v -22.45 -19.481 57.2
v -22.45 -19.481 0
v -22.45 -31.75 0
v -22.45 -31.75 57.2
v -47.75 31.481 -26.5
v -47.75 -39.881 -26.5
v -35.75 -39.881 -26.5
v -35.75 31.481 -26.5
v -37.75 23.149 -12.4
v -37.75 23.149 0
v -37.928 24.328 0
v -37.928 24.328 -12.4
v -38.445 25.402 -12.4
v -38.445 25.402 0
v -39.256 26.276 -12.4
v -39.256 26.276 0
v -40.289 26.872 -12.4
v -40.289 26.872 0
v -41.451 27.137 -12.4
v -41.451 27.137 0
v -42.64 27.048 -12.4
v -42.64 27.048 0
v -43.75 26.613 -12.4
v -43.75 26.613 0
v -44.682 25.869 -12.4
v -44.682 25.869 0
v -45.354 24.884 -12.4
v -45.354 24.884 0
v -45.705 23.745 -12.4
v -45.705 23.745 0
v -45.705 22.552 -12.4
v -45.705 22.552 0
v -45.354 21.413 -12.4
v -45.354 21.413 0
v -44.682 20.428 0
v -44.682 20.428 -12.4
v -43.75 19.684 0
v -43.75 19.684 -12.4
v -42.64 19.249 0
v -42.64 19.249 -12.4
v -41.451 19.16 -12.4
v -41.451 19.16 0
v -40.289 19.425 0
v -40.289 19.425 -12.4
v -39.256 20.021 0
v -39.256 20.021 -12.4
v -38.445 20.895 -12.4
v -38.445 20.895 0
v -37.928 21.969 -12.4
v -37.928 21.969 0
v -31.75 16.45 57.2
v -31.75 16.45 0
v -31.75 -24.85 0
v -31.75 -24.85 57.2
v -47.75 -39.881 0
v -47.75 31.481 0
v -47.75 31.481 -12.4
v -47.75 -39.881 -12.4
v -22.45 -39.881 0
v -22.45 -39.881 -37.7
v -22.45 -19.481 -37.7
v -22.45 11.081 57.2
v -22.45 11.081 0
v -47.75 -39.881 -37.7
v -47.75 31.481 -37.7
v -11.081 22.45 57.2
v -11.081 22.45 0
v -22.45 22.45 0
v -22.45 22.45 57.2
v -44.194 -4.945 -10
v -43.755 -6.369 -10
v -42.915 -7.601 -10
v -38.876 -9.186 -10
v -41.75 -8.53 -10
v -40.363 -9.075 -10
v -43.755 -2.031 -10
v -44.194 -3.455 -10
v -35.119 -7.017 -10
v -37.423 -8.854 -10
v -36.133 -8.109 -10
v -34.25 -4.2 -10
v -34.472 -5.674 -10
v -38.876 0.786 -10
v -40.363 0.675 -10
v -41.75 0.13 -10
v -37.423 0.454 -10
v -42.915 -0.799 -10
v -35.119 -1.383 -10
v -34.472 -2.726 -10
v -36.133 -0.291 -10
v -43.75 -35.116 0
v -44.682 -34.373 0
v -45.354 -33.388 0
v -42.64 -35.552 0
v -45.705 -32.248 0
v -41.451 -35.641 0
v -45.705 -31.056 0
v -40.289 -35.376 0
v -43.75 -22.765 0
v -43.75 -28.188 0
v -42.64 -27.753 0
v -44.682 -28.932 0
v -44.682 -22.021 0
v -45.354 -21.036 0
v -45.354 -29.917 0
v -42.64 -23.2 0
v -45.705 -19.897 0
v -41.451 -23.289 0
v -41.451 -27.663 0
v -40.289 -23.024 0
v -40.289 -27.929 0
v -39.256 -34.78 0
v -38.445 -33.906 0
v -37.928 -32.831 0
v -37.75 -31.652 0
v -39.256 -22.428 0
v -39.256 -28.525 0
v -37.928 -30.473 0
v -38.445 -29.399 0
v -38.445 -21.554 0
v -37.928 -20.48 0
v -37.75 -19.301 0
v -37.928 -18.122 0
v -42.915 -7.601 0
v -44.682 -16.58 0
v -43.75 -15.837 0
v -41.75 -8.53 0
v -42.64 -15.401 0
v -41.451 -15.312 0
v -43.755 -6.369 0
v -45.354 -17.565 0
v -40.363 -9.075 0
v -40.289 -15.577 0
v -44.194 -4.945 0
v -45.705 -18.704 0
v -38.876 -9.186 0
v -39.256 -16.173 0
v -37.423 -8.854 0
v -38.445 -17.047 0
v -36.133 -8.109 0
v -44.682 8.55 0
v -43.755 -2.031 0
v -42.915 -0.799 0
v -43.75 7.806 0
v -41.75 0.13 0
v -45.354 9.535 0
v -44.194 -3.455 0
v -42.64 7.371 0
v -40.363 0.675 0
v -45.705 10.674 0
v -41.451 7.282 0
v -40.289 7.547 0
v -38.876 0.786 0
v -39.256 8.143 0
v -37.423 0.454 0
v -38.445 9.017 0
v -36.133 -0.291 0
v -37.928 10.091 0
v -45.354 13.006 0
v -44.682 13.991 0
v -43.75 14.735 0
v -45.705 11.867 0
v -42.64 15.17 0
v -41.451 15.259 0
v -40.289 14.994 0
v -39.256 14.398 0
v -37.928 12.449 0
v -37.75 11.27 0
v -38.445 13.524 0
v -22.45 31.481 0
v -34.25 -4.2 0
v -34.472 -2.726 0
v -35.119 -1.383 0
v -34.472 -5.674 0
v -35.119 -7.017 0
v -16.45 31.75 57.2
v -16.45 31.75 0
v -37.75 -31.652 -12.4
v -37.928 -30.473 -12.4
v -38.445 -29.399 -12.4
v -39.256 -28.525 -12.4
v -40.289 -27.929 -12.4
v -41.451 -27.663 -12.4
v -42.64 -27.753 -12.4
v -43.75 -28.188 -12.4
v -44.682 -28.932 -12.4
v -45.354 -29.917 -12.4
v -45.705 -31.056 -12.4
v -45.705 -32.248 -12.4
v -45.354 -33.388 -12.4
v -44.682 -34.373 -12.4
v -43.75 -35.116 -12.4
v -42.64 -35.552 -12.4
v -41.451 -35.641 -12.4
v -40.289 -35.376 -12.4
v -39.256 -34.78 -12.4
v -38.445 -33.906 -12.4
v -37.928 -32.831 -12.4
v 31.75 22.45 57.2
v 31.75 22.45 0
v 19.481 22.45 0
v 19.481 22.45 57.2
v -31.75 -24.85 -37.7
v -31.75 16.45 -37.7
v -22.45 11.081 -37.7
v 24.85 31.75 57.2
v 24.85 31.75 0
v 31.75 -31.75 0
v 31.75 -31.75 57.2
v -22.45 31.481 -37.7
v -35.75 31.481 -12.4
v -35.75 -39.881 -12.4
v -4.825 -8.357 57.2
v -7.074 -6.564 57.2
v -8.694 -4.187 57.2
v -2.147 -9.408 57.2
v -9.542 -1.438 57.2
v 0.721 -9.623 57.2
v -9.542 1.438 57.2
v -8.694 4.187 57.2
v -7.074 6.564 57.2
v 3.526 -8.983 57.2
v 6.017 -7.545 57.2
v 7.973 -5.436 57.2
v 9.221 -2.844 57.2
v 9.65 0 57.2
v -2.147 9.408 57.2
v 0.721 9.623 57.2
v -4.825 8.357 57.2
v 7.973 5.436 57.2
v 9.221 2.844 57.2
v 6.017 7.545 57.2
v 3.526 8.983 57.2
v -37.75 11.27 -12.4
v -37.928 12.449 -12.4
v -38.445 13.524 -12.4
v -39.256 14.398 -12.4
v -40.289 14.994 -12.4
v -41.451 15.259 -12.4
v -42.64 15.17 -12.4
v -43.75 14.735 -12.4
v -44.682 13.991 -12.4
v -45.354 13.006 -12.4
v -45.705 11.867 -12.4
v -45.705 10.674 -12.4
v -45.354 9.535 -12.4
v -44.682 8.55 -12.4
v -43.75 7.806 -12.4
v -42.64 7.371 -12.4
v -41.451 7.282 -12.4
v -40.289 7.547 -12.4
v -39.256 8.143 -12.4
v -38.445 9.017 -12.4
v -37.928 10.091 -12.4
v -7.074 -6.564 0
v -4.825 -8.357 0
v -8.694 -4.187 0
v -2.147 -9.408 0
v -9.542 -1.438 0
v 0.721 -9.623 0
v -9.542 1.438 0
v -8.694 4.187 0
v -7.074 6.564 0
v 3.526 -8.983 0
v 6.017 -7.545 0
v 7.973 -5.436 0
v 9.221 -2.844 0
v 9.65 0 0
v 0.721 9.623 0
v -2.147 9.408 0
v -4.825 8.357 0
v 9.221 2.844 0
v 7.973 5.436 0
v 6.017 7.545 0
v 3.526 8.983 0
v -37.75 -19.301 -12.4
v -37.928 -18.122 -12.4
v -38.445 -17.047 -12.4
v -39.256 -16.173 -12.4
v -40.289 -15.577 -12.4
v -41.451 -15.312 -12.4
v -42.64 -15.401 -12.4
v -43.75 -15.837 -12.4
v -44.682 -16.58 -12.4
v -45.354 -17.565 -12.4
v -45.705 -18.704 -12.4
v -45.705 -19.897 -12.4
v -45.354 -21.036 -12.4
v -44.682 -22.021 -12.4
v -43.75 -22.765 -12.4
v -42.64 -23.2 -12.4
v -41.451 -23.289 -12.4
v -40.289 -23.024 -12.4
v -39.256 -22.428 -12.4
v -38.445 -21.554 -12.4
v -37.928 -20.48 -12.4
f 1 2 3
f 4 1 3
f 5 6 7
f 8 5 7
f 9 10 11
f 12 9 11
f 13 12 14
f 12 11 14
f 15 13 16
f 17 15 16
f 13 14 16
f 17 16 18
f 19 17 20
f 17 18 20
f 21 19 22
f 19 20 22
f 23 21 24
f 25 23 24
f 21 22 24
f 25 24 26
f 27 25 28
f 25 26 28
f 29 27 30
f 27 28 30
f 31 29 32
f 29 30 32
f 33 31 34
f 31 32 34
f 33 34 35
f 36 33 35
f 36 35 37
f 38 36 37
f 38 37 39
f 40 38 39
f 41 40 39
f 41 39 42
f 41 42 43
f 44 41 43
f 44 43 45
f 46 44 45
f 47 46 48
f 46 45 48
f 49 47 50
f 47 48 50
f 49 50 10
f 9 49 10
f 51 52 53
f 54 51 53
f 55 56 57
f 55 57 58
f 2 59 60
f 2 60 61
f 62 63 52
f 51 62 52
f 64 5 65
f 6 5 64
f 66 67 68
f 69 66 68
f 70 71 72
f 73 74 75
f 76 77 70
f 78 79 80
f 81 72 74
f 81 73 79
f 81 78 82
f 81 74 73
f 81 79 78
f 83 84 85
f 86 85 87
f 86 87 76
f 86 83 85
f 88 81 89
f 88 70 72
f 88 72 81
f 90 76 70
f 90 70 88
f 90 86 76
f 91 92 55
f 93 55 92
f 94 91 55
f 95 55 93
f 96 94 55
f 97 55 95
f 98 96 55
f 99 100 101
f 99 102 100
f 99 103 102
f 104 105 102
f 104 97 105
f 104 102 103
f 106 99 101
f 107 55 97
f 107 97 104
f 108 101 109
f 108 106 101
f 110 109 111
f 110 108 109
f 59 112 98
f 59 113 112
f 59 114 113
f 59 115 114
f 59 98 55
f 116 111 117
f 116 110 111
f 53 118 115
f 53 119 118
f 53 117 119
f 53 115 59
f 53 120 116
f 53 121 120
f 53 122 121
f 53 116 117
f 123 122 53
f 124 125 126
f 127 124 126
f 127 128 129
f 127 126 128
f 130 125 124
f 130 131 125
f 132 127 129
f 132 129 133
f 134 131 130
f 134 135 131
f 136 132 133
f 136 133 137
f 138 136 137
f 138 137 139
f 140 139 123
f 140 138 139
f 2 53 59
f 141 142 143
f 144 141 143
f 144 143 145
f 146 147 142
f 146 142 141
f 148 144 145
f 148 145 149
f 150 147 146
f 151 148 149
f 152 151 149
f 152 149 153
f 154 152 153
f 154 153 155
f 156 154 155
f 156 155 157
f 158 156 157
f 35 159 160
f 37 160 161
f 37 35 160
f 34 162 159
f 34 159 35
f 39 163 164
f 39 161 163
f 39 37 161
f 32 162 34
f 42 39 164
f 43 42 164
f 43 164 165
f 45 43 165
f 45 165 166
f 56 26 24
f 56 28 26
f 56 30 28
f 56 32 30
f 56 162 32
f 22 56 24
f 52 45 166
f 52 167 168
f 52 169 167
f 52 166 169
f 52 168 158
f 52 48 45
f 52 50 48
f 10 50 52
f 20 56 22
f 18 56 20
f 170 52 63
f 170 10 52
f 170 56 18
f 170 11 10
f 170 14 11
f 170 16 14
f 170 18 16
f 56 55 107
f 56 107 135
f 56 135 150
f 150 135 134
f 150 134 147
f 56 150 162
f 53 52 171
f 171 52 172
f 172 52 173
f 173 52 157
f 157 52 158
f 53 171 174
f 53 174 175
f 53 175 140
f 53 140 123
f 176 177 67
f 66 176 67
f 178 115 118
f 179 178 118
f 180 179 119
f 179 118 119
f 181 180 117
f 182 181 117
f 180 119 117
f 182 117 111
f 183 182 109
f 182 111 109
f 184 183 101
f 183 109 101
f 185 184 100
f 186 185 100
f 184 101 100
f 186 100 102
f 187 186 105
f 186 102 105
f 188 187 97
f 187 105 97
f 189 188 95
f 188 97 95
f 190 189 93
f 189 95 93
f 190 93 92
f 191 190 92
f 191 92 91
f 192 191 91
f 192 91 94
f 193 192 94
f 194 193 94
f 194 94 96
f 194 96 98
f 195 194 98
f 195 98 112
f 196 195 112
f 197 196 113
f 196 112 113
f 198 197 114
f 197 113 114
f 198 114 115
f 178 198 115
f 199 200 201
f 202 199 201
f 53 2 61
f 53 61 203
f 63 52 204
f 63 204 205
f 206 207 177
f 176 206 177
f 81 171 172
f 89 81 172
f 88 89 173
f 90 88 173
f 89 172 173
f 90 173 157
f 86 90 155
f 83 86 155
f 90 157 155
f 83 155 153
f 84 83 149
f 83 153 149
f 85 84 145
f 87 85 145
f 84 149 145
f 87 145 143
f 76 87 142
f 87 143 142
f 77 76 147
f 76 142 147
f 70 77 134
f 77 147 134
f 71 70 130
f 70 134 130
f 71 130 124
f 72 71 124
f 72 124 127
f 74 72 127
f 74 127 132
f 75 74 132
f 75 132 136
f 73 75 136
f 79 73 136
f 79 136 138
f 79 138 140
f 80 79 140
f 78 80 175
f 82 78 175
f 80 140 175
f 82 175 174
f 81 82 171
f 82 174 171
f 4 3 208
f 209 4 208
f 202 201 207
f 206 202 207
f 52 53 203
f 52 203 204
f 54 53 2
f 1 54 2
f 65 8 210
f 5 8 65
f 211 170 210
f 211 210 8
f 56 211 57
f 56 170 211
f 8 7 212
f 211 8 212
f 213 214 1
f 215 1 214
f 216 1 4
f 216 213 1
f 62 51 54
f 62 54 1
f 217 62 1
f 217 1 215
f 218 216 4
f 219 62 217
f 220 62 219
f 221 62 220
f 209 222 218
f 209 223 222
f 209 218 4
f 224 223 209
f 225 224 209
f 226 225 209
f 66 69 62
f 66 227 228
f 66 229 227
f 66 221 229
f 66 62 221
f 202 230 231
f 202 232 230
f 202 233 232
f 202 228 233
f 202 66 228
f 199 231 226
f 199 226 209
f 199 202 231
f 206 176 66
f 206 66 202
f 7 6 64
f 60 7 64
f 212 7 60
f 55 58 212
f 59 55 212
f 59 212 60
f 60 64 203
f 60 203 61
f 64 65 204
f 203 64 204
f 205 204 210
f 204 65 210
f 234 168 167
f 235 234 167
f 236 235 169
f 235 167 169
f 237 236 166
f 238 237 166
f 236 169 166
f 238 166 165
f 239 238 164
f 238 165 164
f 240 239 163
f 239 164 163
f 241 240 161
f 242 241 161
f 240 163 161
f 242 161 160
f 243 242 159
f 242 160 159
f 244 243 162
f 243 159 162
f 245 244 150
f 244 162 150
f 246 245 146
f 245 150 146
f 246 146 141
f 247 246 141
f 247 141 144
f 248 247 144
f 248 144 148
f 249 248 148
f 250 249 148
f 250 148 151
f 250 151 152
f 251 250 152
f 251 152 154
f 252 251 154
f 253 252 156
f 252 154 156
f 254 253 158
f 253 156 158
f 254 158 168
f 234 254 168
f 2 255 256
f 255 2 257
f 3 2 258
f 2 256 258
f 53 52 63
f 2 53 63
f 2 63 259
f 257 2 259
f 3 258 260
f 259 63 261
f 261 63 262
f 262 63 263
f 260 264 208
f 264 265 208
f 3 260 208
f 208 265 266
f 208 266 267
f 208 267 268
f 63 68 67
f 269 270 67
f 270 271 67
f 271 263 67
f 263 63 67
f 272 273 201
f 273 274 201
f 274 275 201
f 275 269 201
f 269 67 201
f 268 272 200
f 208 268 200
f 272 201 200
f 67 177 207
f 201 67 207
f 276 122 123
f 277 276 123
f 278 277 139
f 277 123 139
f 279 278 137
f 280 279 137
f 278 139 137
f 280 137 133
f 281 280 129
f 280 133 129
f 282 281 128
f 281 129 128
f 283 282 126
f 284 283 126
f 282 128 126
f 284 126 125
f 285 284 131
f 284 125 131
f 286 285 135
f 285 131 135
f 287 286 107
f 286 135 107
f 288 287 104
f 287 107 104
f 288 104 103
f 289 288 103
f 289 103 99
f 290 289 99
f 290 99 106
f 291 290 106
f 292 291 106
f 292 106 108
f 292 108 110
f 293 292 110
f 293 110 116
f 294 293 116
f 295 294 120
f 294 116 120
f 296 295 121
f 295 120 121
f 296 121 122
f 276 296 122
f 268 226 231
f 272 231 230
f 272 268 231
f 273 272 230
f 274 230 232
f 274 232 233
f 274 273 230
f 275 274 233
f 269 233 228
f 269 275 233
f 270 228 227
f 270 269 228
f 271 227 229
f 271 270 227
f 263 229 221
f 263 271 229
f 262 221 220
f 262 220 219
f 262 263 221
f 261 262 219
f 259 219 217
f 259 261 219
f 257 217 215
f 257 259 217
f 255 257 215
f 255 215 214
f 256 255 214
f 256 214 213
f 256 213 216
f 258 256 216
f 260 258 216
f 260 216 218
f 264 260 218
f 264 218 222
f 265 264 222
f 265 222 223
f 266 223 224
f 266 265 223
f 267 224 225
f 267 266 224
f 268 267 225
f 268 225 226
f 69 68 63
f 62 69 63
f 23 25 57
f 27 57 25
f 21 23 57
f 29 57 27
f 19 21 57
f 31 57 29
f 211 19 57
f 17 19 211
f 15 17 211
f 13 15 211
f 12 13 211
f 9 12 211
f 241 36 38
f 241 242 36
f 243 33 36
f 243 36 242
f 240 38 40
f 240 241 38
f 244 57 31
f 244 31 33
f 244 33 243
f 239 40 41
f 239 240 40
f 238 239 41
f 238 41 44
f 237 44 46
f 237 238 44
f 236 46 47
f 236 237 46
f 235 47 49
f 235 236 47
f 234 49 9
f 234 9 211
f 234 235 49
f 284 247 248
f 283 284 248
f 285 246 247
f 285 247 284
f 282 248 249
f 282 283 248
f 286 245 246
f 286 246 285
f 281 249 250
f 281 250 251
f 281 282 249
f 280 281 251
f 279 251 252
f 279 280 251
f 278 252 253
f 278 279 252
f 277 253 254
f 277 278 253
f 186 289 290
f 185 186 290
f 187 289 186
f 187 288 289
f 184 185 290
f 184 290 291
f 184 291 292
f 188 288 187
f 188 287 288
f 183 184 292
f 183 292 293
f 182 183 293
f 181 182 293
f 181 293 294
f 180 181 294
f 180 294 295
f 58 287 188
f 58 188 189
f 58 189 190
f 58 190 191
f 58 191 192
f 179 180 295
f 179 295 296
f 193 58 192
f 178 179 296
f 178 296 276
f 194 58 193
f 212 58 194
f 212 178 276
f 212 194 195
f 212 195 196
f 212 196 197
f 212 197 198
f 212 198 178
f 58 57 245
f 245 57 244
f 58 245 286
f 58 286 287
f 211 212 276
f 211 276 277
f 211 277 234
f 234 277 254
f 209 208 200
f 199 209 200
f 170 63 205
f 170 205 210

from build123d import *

# Parameters (mm, degrees)
F0_R     = 9.65
F1_DEPTH = 57.2
F2_R     = 4
F2_R_2   = 5
F3_DEPTH = 37.7
F4_W     = 12
F4_H     = 14.1
F5_DEPTH = 71.631642
F6_DEPTH = 10
F7_DEPTH = 12.4


with BuildPart() as f1:
    # F0 (on Top) → F1 (new body)
    with BuildSketch(Plane.XY):
        Polygon((-22.45, -31.75), (31.75, -31.75), (31.75, 22.45), (19.480642, 22.45), (24.85, 31.75), (-16.45, 31.75), (-11.080642, 22.45), (-22.45, 22.45), (-22.45, 11.080642), (-31.75, 16.45), (-31.75, -24.85), (-22.45, -19.480642), align=None)
        Circle(F0_R, mode=Mode.SUBTRACT)
    extrude(amount=F1_DEPTH)


with BuildPart() as f3:
    # F2 (on Top) → F3 (new body)
    with BuildSketch(Plane.XY):
        Polygon((-31.75, 16.45), (-22.45, 11.080642), (-22.45, 22.45), (-22.45, 31.480642), (-47.75, 31.480642), (-47.75, -39.880642), (-22.45, -39.880642), (-22.45, -31.75), (-22.45, -19.480642), (-31.75, -24.85), align=None)
        with Locations((-41.75, -31.652287)):
            Circle(F2_R, mode=Mode.SUBTRACT)
        with Locations((-41.75, -19.300643)):
            Circle(F2_R, mode=Mode.SUBTRACT)
        with Locations((-41.75, 11.270437)):
            Circle(F2_R, mode=Mode.SUBTRACT)
        with Locations((-39.25, -4.2)):
            Circle(F2_R_2, mode=Mode.SUBTRACT)
        with Locations((-41.75, 23.148505)):
            Circle(F2_R, mode=Mode.SUBTRACT)
        with Locations((-41.75, -31.652287)):
            Circle(F2_R)
        with Locations((-41.75, -19.300643)):
            Circle(F2_R)
        with Locations((-39.25, -4.2)):
            Circle(F2_R_2)
        with Locations((-41.75, 11.270437)):
            Circle(F2_R)
        with Locations((-41.75, 23.148505)):
            Circle(F2_R)
    extrude(amount=-F3_DEPTH)

    # F4 (on face) → F5 (cut, through all)
    with BuildSketch(Plane.XZ.offset(39.880642)):
        with Locations((-41.75, -19.45)):
            Rectangle(F4_W, F4_H)
    extrude(amount=-F5_DEPTH, mode=Mode.SUBTRACT)

    # F2 (on Top) → F6 (cut)
    with BuildSketch(Plane.XY):
        with Locations((-39.25, -4.2)):
            Circle(F2_R_2)
    extrude(amount=-F6_DEPTH, mode=Mode.SUBTRACT)

    # F2 (on Top) → F7 (cut, through all)
    with BuildSketch(Plane.XY):
        with Locations((-41.75, 23.148505)):
            Circle(F2_R)
        with Locations((-41.75, 11.270437)):
            Circle(F2_R)
        with Locations((-41.75, -19.300643)):
            Circle(F2_R)
        with Locations((-41.75, -31.652287)):
            Circle(F2_R)
    extrude(amount=-F7_DEPTH, mode=Mode.SUBTRACT)


solid = Compound([f1.part, f3.part])
